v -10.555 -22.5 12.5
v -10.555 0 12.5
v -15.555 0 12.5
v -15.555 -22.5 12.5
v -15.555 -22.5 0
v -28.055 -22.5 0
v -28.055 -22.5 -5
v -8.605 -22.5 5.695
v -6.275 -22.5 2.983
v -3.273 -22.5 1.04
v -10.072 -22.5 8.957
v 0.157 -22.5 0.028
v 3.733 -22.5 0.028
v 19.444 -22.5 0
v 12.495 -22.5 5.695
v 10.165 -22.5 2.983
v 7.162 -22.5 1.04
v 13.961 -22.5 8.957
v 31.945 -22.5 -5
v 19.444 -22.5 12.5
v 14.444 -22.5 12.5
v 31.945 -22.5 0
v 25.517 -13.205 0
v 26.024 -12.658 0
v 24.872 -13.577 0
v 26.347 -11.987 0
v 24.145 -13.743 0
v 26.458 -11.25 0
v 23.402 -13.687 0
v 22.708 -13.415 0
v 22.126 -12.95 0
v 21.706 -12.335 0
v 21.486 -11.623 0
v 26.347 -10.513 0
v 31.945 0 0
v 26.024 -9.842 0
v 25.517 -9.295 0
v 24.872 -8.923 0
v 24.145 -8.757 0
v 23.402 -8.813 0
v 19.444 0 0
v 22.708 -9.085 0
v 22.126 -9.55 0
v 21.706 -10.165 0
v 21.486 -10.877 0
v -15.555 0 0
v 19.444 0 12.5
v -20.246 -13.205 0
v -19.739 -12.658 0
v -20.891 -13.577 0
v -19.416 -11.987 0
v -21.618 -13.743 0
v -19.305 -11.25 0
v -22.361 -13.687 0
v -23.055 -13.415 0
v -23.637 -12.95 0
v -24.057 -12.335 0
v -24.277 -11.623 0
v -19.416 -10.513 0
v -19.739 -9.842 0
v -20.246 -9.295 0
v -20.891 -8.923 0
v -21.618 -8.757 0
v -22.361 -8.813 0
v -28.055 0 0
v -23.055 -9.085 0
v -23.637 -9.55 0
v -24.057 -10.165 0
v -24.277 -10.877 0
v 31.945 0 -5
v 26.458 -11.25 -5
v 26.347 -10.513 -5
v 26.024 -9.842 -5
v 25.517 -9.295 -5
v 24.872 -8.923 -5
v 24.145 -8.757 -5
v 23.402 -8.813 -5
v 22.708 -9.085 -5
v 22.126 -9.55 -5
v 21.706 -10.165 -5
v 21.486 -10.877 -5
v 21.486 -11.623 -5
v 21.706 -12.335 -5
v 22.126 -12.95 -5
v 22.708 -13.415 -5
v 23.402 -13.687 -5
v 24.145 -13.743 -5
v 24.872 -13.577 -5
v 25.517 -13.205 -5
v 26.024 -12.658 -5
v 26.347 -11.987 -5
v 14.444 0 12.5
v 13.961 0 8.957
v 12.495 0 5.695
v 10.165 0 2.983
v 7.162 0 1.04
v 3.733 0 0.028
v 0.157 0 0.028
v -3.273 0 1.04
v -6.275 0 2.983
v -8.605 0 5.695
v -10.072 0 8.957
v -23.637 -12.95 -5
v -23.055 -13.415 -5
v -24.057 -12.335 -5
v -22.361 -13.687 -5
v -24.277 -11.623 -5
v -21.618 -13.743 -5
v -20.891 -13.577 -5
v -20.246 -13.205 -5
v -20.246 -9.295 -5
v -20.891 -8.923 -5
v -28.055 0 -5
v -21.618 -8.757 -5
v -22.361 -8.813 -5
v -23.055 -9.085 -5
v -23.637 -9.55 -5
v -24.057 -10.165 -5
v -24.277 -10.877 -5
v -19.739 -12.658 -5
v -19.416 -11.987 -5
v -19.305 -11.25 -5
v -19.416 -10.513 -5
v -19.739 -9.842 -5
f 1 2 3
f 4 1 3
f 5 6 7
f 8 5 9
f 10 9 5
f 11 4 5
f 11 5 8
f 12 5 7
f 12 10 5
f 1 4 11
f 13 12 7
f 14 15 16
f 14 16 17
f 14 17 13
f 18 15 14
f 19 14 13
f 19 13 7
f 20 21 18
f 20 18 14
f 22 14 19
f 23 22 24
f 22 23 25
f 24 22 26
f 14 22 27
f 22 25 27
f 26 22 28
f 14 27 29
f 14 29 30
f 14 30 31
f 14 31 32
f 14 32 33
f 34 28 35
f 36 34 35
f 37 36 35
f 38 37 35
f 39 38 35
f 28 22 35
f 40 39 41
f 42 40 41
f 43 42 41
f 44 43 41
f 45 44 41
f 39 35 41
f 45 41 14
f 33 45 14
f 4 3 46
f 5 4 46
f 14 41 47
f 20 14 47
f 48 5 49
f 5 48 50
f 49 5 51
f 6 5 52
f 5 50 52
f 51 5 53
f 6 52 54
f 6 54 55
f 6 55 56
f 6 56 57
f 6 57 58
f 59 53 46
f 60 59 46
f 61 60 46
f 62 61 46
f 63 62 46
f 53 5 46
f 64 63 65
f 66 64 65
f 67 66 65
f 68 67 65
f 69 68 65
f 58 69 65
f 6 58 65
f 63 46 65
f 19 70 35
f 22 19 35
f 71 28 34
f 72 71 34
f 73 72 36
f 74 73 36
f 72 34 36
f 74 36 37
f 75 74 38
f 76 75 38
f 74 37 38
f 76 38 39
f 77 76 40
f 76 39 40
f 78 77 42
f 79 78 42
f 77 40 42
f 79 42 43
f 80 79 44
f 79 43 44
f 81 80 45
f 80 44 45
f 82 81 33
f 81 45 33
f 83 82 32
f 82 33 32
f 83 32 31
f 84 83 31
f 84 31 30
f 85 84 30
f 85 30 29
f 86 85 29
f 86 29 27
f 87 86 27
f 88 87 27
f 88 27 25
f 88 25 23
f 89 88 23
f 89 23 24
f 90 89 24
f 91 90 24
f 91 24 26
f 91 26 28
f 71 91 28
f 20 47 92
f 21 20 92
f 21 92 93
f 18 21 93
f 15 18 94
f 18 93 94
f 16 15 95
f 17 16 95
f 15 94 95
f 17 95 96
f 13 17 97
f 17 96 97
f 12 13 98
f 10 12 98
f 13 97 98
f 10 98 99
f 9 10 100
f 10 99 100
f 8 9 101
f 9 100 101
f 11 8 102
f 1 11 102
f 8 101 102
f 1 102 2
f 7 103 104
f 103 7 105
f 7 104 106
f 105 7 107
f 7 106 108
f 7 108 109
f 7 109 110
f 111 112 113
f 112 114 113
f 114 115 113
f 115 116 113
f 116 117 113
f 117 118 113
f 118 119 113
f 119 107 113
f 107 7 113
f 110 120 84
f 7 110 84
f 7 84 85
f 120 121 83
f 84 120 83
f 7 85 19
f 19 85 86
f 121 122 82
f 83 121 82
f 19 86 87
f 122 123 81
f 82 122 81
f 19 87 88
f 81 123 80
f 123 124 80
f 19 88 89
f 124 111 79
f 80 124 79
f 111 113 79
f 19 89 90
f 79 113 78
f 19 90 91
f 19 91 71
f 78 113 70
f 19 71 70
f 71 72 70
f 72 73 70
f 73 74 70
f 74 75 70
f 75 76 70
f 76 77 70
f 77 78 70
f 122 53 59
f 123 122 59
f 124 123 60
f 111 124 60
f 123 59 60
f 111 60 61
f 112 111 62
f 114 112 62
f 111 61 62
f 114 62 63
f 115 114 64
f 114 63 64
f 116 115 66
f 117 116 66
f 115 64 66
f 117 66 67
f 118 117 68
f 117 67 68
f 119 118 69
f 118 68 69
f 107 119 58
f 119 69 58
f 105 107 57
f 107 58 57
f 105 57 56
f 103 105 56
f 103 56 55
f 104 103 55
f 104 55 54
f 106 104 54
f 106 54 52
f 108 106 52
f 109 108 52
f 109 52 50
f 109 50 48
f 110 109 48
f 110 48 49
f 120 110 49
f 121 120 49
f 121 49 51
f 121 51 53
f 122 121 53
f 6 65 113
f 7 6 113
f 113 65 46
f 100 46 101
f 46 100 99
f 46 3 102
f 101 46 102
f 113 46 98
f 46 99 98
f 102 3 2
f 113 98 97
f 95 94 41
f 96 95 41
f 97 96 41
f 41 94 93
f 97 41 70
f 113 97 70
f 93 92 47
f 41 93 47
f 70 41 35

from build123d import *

# Parameters (mm, degrees)
F1_DEPTH = 22.5
F2_R     = 2.5
F3_DEPTH = 5.001
F4_R     = 2.5
F5_DEPTH = 25


with BuildPart() as f1:
    # F0 (on Front) → F1 (new body)
    with BuildSketch(Plane.XZ):
        with BuildLine():
            Line((-28.054744, -5), (31.945256, -5))
            Line((31.945256, -5), (31.945256, 0))
            Line((31.945256, 0), (19.444446, 0))
            Line((19.444446, 0), (19.444446, 12.5))
            Line((19.444446, 12.5), (14.444446, 12.5))
            ThreePointArc((14.444446, 12.5), (1.944851, -0.100626), (-10.554744, 12.5))
            Line((-10.554744, 12.5), (-15.554744, 12.5))
            Line((-15.554744, 12.5), (-15.554744, 0))
            Line((-15.554744, 0), (-28.054744, 0))
            Line((-28.054744, 0), (-28.054744, -5))
        make_face()
    extrude(amount=F1_DEPTH)

    # F2 (on face) → F3 (cut, through all)
    with BuildSketch(Plane.XY):
        with Locations((23.958334, -11.25)):
            Circle(F2_R)
    extrude(amount=-F3_DEPTH, mode=Mode.SUBTRACT)

    # F4 (on face) → F5 (cut)
    with BuildSketch(Plane.XY):
        with Locations((-21.804744, -11.25)):
            Circle(F4_R)
    extrude(amount=-F5_DEPTH, mode=Mode.SUBTRACT)


solid = f1.part
